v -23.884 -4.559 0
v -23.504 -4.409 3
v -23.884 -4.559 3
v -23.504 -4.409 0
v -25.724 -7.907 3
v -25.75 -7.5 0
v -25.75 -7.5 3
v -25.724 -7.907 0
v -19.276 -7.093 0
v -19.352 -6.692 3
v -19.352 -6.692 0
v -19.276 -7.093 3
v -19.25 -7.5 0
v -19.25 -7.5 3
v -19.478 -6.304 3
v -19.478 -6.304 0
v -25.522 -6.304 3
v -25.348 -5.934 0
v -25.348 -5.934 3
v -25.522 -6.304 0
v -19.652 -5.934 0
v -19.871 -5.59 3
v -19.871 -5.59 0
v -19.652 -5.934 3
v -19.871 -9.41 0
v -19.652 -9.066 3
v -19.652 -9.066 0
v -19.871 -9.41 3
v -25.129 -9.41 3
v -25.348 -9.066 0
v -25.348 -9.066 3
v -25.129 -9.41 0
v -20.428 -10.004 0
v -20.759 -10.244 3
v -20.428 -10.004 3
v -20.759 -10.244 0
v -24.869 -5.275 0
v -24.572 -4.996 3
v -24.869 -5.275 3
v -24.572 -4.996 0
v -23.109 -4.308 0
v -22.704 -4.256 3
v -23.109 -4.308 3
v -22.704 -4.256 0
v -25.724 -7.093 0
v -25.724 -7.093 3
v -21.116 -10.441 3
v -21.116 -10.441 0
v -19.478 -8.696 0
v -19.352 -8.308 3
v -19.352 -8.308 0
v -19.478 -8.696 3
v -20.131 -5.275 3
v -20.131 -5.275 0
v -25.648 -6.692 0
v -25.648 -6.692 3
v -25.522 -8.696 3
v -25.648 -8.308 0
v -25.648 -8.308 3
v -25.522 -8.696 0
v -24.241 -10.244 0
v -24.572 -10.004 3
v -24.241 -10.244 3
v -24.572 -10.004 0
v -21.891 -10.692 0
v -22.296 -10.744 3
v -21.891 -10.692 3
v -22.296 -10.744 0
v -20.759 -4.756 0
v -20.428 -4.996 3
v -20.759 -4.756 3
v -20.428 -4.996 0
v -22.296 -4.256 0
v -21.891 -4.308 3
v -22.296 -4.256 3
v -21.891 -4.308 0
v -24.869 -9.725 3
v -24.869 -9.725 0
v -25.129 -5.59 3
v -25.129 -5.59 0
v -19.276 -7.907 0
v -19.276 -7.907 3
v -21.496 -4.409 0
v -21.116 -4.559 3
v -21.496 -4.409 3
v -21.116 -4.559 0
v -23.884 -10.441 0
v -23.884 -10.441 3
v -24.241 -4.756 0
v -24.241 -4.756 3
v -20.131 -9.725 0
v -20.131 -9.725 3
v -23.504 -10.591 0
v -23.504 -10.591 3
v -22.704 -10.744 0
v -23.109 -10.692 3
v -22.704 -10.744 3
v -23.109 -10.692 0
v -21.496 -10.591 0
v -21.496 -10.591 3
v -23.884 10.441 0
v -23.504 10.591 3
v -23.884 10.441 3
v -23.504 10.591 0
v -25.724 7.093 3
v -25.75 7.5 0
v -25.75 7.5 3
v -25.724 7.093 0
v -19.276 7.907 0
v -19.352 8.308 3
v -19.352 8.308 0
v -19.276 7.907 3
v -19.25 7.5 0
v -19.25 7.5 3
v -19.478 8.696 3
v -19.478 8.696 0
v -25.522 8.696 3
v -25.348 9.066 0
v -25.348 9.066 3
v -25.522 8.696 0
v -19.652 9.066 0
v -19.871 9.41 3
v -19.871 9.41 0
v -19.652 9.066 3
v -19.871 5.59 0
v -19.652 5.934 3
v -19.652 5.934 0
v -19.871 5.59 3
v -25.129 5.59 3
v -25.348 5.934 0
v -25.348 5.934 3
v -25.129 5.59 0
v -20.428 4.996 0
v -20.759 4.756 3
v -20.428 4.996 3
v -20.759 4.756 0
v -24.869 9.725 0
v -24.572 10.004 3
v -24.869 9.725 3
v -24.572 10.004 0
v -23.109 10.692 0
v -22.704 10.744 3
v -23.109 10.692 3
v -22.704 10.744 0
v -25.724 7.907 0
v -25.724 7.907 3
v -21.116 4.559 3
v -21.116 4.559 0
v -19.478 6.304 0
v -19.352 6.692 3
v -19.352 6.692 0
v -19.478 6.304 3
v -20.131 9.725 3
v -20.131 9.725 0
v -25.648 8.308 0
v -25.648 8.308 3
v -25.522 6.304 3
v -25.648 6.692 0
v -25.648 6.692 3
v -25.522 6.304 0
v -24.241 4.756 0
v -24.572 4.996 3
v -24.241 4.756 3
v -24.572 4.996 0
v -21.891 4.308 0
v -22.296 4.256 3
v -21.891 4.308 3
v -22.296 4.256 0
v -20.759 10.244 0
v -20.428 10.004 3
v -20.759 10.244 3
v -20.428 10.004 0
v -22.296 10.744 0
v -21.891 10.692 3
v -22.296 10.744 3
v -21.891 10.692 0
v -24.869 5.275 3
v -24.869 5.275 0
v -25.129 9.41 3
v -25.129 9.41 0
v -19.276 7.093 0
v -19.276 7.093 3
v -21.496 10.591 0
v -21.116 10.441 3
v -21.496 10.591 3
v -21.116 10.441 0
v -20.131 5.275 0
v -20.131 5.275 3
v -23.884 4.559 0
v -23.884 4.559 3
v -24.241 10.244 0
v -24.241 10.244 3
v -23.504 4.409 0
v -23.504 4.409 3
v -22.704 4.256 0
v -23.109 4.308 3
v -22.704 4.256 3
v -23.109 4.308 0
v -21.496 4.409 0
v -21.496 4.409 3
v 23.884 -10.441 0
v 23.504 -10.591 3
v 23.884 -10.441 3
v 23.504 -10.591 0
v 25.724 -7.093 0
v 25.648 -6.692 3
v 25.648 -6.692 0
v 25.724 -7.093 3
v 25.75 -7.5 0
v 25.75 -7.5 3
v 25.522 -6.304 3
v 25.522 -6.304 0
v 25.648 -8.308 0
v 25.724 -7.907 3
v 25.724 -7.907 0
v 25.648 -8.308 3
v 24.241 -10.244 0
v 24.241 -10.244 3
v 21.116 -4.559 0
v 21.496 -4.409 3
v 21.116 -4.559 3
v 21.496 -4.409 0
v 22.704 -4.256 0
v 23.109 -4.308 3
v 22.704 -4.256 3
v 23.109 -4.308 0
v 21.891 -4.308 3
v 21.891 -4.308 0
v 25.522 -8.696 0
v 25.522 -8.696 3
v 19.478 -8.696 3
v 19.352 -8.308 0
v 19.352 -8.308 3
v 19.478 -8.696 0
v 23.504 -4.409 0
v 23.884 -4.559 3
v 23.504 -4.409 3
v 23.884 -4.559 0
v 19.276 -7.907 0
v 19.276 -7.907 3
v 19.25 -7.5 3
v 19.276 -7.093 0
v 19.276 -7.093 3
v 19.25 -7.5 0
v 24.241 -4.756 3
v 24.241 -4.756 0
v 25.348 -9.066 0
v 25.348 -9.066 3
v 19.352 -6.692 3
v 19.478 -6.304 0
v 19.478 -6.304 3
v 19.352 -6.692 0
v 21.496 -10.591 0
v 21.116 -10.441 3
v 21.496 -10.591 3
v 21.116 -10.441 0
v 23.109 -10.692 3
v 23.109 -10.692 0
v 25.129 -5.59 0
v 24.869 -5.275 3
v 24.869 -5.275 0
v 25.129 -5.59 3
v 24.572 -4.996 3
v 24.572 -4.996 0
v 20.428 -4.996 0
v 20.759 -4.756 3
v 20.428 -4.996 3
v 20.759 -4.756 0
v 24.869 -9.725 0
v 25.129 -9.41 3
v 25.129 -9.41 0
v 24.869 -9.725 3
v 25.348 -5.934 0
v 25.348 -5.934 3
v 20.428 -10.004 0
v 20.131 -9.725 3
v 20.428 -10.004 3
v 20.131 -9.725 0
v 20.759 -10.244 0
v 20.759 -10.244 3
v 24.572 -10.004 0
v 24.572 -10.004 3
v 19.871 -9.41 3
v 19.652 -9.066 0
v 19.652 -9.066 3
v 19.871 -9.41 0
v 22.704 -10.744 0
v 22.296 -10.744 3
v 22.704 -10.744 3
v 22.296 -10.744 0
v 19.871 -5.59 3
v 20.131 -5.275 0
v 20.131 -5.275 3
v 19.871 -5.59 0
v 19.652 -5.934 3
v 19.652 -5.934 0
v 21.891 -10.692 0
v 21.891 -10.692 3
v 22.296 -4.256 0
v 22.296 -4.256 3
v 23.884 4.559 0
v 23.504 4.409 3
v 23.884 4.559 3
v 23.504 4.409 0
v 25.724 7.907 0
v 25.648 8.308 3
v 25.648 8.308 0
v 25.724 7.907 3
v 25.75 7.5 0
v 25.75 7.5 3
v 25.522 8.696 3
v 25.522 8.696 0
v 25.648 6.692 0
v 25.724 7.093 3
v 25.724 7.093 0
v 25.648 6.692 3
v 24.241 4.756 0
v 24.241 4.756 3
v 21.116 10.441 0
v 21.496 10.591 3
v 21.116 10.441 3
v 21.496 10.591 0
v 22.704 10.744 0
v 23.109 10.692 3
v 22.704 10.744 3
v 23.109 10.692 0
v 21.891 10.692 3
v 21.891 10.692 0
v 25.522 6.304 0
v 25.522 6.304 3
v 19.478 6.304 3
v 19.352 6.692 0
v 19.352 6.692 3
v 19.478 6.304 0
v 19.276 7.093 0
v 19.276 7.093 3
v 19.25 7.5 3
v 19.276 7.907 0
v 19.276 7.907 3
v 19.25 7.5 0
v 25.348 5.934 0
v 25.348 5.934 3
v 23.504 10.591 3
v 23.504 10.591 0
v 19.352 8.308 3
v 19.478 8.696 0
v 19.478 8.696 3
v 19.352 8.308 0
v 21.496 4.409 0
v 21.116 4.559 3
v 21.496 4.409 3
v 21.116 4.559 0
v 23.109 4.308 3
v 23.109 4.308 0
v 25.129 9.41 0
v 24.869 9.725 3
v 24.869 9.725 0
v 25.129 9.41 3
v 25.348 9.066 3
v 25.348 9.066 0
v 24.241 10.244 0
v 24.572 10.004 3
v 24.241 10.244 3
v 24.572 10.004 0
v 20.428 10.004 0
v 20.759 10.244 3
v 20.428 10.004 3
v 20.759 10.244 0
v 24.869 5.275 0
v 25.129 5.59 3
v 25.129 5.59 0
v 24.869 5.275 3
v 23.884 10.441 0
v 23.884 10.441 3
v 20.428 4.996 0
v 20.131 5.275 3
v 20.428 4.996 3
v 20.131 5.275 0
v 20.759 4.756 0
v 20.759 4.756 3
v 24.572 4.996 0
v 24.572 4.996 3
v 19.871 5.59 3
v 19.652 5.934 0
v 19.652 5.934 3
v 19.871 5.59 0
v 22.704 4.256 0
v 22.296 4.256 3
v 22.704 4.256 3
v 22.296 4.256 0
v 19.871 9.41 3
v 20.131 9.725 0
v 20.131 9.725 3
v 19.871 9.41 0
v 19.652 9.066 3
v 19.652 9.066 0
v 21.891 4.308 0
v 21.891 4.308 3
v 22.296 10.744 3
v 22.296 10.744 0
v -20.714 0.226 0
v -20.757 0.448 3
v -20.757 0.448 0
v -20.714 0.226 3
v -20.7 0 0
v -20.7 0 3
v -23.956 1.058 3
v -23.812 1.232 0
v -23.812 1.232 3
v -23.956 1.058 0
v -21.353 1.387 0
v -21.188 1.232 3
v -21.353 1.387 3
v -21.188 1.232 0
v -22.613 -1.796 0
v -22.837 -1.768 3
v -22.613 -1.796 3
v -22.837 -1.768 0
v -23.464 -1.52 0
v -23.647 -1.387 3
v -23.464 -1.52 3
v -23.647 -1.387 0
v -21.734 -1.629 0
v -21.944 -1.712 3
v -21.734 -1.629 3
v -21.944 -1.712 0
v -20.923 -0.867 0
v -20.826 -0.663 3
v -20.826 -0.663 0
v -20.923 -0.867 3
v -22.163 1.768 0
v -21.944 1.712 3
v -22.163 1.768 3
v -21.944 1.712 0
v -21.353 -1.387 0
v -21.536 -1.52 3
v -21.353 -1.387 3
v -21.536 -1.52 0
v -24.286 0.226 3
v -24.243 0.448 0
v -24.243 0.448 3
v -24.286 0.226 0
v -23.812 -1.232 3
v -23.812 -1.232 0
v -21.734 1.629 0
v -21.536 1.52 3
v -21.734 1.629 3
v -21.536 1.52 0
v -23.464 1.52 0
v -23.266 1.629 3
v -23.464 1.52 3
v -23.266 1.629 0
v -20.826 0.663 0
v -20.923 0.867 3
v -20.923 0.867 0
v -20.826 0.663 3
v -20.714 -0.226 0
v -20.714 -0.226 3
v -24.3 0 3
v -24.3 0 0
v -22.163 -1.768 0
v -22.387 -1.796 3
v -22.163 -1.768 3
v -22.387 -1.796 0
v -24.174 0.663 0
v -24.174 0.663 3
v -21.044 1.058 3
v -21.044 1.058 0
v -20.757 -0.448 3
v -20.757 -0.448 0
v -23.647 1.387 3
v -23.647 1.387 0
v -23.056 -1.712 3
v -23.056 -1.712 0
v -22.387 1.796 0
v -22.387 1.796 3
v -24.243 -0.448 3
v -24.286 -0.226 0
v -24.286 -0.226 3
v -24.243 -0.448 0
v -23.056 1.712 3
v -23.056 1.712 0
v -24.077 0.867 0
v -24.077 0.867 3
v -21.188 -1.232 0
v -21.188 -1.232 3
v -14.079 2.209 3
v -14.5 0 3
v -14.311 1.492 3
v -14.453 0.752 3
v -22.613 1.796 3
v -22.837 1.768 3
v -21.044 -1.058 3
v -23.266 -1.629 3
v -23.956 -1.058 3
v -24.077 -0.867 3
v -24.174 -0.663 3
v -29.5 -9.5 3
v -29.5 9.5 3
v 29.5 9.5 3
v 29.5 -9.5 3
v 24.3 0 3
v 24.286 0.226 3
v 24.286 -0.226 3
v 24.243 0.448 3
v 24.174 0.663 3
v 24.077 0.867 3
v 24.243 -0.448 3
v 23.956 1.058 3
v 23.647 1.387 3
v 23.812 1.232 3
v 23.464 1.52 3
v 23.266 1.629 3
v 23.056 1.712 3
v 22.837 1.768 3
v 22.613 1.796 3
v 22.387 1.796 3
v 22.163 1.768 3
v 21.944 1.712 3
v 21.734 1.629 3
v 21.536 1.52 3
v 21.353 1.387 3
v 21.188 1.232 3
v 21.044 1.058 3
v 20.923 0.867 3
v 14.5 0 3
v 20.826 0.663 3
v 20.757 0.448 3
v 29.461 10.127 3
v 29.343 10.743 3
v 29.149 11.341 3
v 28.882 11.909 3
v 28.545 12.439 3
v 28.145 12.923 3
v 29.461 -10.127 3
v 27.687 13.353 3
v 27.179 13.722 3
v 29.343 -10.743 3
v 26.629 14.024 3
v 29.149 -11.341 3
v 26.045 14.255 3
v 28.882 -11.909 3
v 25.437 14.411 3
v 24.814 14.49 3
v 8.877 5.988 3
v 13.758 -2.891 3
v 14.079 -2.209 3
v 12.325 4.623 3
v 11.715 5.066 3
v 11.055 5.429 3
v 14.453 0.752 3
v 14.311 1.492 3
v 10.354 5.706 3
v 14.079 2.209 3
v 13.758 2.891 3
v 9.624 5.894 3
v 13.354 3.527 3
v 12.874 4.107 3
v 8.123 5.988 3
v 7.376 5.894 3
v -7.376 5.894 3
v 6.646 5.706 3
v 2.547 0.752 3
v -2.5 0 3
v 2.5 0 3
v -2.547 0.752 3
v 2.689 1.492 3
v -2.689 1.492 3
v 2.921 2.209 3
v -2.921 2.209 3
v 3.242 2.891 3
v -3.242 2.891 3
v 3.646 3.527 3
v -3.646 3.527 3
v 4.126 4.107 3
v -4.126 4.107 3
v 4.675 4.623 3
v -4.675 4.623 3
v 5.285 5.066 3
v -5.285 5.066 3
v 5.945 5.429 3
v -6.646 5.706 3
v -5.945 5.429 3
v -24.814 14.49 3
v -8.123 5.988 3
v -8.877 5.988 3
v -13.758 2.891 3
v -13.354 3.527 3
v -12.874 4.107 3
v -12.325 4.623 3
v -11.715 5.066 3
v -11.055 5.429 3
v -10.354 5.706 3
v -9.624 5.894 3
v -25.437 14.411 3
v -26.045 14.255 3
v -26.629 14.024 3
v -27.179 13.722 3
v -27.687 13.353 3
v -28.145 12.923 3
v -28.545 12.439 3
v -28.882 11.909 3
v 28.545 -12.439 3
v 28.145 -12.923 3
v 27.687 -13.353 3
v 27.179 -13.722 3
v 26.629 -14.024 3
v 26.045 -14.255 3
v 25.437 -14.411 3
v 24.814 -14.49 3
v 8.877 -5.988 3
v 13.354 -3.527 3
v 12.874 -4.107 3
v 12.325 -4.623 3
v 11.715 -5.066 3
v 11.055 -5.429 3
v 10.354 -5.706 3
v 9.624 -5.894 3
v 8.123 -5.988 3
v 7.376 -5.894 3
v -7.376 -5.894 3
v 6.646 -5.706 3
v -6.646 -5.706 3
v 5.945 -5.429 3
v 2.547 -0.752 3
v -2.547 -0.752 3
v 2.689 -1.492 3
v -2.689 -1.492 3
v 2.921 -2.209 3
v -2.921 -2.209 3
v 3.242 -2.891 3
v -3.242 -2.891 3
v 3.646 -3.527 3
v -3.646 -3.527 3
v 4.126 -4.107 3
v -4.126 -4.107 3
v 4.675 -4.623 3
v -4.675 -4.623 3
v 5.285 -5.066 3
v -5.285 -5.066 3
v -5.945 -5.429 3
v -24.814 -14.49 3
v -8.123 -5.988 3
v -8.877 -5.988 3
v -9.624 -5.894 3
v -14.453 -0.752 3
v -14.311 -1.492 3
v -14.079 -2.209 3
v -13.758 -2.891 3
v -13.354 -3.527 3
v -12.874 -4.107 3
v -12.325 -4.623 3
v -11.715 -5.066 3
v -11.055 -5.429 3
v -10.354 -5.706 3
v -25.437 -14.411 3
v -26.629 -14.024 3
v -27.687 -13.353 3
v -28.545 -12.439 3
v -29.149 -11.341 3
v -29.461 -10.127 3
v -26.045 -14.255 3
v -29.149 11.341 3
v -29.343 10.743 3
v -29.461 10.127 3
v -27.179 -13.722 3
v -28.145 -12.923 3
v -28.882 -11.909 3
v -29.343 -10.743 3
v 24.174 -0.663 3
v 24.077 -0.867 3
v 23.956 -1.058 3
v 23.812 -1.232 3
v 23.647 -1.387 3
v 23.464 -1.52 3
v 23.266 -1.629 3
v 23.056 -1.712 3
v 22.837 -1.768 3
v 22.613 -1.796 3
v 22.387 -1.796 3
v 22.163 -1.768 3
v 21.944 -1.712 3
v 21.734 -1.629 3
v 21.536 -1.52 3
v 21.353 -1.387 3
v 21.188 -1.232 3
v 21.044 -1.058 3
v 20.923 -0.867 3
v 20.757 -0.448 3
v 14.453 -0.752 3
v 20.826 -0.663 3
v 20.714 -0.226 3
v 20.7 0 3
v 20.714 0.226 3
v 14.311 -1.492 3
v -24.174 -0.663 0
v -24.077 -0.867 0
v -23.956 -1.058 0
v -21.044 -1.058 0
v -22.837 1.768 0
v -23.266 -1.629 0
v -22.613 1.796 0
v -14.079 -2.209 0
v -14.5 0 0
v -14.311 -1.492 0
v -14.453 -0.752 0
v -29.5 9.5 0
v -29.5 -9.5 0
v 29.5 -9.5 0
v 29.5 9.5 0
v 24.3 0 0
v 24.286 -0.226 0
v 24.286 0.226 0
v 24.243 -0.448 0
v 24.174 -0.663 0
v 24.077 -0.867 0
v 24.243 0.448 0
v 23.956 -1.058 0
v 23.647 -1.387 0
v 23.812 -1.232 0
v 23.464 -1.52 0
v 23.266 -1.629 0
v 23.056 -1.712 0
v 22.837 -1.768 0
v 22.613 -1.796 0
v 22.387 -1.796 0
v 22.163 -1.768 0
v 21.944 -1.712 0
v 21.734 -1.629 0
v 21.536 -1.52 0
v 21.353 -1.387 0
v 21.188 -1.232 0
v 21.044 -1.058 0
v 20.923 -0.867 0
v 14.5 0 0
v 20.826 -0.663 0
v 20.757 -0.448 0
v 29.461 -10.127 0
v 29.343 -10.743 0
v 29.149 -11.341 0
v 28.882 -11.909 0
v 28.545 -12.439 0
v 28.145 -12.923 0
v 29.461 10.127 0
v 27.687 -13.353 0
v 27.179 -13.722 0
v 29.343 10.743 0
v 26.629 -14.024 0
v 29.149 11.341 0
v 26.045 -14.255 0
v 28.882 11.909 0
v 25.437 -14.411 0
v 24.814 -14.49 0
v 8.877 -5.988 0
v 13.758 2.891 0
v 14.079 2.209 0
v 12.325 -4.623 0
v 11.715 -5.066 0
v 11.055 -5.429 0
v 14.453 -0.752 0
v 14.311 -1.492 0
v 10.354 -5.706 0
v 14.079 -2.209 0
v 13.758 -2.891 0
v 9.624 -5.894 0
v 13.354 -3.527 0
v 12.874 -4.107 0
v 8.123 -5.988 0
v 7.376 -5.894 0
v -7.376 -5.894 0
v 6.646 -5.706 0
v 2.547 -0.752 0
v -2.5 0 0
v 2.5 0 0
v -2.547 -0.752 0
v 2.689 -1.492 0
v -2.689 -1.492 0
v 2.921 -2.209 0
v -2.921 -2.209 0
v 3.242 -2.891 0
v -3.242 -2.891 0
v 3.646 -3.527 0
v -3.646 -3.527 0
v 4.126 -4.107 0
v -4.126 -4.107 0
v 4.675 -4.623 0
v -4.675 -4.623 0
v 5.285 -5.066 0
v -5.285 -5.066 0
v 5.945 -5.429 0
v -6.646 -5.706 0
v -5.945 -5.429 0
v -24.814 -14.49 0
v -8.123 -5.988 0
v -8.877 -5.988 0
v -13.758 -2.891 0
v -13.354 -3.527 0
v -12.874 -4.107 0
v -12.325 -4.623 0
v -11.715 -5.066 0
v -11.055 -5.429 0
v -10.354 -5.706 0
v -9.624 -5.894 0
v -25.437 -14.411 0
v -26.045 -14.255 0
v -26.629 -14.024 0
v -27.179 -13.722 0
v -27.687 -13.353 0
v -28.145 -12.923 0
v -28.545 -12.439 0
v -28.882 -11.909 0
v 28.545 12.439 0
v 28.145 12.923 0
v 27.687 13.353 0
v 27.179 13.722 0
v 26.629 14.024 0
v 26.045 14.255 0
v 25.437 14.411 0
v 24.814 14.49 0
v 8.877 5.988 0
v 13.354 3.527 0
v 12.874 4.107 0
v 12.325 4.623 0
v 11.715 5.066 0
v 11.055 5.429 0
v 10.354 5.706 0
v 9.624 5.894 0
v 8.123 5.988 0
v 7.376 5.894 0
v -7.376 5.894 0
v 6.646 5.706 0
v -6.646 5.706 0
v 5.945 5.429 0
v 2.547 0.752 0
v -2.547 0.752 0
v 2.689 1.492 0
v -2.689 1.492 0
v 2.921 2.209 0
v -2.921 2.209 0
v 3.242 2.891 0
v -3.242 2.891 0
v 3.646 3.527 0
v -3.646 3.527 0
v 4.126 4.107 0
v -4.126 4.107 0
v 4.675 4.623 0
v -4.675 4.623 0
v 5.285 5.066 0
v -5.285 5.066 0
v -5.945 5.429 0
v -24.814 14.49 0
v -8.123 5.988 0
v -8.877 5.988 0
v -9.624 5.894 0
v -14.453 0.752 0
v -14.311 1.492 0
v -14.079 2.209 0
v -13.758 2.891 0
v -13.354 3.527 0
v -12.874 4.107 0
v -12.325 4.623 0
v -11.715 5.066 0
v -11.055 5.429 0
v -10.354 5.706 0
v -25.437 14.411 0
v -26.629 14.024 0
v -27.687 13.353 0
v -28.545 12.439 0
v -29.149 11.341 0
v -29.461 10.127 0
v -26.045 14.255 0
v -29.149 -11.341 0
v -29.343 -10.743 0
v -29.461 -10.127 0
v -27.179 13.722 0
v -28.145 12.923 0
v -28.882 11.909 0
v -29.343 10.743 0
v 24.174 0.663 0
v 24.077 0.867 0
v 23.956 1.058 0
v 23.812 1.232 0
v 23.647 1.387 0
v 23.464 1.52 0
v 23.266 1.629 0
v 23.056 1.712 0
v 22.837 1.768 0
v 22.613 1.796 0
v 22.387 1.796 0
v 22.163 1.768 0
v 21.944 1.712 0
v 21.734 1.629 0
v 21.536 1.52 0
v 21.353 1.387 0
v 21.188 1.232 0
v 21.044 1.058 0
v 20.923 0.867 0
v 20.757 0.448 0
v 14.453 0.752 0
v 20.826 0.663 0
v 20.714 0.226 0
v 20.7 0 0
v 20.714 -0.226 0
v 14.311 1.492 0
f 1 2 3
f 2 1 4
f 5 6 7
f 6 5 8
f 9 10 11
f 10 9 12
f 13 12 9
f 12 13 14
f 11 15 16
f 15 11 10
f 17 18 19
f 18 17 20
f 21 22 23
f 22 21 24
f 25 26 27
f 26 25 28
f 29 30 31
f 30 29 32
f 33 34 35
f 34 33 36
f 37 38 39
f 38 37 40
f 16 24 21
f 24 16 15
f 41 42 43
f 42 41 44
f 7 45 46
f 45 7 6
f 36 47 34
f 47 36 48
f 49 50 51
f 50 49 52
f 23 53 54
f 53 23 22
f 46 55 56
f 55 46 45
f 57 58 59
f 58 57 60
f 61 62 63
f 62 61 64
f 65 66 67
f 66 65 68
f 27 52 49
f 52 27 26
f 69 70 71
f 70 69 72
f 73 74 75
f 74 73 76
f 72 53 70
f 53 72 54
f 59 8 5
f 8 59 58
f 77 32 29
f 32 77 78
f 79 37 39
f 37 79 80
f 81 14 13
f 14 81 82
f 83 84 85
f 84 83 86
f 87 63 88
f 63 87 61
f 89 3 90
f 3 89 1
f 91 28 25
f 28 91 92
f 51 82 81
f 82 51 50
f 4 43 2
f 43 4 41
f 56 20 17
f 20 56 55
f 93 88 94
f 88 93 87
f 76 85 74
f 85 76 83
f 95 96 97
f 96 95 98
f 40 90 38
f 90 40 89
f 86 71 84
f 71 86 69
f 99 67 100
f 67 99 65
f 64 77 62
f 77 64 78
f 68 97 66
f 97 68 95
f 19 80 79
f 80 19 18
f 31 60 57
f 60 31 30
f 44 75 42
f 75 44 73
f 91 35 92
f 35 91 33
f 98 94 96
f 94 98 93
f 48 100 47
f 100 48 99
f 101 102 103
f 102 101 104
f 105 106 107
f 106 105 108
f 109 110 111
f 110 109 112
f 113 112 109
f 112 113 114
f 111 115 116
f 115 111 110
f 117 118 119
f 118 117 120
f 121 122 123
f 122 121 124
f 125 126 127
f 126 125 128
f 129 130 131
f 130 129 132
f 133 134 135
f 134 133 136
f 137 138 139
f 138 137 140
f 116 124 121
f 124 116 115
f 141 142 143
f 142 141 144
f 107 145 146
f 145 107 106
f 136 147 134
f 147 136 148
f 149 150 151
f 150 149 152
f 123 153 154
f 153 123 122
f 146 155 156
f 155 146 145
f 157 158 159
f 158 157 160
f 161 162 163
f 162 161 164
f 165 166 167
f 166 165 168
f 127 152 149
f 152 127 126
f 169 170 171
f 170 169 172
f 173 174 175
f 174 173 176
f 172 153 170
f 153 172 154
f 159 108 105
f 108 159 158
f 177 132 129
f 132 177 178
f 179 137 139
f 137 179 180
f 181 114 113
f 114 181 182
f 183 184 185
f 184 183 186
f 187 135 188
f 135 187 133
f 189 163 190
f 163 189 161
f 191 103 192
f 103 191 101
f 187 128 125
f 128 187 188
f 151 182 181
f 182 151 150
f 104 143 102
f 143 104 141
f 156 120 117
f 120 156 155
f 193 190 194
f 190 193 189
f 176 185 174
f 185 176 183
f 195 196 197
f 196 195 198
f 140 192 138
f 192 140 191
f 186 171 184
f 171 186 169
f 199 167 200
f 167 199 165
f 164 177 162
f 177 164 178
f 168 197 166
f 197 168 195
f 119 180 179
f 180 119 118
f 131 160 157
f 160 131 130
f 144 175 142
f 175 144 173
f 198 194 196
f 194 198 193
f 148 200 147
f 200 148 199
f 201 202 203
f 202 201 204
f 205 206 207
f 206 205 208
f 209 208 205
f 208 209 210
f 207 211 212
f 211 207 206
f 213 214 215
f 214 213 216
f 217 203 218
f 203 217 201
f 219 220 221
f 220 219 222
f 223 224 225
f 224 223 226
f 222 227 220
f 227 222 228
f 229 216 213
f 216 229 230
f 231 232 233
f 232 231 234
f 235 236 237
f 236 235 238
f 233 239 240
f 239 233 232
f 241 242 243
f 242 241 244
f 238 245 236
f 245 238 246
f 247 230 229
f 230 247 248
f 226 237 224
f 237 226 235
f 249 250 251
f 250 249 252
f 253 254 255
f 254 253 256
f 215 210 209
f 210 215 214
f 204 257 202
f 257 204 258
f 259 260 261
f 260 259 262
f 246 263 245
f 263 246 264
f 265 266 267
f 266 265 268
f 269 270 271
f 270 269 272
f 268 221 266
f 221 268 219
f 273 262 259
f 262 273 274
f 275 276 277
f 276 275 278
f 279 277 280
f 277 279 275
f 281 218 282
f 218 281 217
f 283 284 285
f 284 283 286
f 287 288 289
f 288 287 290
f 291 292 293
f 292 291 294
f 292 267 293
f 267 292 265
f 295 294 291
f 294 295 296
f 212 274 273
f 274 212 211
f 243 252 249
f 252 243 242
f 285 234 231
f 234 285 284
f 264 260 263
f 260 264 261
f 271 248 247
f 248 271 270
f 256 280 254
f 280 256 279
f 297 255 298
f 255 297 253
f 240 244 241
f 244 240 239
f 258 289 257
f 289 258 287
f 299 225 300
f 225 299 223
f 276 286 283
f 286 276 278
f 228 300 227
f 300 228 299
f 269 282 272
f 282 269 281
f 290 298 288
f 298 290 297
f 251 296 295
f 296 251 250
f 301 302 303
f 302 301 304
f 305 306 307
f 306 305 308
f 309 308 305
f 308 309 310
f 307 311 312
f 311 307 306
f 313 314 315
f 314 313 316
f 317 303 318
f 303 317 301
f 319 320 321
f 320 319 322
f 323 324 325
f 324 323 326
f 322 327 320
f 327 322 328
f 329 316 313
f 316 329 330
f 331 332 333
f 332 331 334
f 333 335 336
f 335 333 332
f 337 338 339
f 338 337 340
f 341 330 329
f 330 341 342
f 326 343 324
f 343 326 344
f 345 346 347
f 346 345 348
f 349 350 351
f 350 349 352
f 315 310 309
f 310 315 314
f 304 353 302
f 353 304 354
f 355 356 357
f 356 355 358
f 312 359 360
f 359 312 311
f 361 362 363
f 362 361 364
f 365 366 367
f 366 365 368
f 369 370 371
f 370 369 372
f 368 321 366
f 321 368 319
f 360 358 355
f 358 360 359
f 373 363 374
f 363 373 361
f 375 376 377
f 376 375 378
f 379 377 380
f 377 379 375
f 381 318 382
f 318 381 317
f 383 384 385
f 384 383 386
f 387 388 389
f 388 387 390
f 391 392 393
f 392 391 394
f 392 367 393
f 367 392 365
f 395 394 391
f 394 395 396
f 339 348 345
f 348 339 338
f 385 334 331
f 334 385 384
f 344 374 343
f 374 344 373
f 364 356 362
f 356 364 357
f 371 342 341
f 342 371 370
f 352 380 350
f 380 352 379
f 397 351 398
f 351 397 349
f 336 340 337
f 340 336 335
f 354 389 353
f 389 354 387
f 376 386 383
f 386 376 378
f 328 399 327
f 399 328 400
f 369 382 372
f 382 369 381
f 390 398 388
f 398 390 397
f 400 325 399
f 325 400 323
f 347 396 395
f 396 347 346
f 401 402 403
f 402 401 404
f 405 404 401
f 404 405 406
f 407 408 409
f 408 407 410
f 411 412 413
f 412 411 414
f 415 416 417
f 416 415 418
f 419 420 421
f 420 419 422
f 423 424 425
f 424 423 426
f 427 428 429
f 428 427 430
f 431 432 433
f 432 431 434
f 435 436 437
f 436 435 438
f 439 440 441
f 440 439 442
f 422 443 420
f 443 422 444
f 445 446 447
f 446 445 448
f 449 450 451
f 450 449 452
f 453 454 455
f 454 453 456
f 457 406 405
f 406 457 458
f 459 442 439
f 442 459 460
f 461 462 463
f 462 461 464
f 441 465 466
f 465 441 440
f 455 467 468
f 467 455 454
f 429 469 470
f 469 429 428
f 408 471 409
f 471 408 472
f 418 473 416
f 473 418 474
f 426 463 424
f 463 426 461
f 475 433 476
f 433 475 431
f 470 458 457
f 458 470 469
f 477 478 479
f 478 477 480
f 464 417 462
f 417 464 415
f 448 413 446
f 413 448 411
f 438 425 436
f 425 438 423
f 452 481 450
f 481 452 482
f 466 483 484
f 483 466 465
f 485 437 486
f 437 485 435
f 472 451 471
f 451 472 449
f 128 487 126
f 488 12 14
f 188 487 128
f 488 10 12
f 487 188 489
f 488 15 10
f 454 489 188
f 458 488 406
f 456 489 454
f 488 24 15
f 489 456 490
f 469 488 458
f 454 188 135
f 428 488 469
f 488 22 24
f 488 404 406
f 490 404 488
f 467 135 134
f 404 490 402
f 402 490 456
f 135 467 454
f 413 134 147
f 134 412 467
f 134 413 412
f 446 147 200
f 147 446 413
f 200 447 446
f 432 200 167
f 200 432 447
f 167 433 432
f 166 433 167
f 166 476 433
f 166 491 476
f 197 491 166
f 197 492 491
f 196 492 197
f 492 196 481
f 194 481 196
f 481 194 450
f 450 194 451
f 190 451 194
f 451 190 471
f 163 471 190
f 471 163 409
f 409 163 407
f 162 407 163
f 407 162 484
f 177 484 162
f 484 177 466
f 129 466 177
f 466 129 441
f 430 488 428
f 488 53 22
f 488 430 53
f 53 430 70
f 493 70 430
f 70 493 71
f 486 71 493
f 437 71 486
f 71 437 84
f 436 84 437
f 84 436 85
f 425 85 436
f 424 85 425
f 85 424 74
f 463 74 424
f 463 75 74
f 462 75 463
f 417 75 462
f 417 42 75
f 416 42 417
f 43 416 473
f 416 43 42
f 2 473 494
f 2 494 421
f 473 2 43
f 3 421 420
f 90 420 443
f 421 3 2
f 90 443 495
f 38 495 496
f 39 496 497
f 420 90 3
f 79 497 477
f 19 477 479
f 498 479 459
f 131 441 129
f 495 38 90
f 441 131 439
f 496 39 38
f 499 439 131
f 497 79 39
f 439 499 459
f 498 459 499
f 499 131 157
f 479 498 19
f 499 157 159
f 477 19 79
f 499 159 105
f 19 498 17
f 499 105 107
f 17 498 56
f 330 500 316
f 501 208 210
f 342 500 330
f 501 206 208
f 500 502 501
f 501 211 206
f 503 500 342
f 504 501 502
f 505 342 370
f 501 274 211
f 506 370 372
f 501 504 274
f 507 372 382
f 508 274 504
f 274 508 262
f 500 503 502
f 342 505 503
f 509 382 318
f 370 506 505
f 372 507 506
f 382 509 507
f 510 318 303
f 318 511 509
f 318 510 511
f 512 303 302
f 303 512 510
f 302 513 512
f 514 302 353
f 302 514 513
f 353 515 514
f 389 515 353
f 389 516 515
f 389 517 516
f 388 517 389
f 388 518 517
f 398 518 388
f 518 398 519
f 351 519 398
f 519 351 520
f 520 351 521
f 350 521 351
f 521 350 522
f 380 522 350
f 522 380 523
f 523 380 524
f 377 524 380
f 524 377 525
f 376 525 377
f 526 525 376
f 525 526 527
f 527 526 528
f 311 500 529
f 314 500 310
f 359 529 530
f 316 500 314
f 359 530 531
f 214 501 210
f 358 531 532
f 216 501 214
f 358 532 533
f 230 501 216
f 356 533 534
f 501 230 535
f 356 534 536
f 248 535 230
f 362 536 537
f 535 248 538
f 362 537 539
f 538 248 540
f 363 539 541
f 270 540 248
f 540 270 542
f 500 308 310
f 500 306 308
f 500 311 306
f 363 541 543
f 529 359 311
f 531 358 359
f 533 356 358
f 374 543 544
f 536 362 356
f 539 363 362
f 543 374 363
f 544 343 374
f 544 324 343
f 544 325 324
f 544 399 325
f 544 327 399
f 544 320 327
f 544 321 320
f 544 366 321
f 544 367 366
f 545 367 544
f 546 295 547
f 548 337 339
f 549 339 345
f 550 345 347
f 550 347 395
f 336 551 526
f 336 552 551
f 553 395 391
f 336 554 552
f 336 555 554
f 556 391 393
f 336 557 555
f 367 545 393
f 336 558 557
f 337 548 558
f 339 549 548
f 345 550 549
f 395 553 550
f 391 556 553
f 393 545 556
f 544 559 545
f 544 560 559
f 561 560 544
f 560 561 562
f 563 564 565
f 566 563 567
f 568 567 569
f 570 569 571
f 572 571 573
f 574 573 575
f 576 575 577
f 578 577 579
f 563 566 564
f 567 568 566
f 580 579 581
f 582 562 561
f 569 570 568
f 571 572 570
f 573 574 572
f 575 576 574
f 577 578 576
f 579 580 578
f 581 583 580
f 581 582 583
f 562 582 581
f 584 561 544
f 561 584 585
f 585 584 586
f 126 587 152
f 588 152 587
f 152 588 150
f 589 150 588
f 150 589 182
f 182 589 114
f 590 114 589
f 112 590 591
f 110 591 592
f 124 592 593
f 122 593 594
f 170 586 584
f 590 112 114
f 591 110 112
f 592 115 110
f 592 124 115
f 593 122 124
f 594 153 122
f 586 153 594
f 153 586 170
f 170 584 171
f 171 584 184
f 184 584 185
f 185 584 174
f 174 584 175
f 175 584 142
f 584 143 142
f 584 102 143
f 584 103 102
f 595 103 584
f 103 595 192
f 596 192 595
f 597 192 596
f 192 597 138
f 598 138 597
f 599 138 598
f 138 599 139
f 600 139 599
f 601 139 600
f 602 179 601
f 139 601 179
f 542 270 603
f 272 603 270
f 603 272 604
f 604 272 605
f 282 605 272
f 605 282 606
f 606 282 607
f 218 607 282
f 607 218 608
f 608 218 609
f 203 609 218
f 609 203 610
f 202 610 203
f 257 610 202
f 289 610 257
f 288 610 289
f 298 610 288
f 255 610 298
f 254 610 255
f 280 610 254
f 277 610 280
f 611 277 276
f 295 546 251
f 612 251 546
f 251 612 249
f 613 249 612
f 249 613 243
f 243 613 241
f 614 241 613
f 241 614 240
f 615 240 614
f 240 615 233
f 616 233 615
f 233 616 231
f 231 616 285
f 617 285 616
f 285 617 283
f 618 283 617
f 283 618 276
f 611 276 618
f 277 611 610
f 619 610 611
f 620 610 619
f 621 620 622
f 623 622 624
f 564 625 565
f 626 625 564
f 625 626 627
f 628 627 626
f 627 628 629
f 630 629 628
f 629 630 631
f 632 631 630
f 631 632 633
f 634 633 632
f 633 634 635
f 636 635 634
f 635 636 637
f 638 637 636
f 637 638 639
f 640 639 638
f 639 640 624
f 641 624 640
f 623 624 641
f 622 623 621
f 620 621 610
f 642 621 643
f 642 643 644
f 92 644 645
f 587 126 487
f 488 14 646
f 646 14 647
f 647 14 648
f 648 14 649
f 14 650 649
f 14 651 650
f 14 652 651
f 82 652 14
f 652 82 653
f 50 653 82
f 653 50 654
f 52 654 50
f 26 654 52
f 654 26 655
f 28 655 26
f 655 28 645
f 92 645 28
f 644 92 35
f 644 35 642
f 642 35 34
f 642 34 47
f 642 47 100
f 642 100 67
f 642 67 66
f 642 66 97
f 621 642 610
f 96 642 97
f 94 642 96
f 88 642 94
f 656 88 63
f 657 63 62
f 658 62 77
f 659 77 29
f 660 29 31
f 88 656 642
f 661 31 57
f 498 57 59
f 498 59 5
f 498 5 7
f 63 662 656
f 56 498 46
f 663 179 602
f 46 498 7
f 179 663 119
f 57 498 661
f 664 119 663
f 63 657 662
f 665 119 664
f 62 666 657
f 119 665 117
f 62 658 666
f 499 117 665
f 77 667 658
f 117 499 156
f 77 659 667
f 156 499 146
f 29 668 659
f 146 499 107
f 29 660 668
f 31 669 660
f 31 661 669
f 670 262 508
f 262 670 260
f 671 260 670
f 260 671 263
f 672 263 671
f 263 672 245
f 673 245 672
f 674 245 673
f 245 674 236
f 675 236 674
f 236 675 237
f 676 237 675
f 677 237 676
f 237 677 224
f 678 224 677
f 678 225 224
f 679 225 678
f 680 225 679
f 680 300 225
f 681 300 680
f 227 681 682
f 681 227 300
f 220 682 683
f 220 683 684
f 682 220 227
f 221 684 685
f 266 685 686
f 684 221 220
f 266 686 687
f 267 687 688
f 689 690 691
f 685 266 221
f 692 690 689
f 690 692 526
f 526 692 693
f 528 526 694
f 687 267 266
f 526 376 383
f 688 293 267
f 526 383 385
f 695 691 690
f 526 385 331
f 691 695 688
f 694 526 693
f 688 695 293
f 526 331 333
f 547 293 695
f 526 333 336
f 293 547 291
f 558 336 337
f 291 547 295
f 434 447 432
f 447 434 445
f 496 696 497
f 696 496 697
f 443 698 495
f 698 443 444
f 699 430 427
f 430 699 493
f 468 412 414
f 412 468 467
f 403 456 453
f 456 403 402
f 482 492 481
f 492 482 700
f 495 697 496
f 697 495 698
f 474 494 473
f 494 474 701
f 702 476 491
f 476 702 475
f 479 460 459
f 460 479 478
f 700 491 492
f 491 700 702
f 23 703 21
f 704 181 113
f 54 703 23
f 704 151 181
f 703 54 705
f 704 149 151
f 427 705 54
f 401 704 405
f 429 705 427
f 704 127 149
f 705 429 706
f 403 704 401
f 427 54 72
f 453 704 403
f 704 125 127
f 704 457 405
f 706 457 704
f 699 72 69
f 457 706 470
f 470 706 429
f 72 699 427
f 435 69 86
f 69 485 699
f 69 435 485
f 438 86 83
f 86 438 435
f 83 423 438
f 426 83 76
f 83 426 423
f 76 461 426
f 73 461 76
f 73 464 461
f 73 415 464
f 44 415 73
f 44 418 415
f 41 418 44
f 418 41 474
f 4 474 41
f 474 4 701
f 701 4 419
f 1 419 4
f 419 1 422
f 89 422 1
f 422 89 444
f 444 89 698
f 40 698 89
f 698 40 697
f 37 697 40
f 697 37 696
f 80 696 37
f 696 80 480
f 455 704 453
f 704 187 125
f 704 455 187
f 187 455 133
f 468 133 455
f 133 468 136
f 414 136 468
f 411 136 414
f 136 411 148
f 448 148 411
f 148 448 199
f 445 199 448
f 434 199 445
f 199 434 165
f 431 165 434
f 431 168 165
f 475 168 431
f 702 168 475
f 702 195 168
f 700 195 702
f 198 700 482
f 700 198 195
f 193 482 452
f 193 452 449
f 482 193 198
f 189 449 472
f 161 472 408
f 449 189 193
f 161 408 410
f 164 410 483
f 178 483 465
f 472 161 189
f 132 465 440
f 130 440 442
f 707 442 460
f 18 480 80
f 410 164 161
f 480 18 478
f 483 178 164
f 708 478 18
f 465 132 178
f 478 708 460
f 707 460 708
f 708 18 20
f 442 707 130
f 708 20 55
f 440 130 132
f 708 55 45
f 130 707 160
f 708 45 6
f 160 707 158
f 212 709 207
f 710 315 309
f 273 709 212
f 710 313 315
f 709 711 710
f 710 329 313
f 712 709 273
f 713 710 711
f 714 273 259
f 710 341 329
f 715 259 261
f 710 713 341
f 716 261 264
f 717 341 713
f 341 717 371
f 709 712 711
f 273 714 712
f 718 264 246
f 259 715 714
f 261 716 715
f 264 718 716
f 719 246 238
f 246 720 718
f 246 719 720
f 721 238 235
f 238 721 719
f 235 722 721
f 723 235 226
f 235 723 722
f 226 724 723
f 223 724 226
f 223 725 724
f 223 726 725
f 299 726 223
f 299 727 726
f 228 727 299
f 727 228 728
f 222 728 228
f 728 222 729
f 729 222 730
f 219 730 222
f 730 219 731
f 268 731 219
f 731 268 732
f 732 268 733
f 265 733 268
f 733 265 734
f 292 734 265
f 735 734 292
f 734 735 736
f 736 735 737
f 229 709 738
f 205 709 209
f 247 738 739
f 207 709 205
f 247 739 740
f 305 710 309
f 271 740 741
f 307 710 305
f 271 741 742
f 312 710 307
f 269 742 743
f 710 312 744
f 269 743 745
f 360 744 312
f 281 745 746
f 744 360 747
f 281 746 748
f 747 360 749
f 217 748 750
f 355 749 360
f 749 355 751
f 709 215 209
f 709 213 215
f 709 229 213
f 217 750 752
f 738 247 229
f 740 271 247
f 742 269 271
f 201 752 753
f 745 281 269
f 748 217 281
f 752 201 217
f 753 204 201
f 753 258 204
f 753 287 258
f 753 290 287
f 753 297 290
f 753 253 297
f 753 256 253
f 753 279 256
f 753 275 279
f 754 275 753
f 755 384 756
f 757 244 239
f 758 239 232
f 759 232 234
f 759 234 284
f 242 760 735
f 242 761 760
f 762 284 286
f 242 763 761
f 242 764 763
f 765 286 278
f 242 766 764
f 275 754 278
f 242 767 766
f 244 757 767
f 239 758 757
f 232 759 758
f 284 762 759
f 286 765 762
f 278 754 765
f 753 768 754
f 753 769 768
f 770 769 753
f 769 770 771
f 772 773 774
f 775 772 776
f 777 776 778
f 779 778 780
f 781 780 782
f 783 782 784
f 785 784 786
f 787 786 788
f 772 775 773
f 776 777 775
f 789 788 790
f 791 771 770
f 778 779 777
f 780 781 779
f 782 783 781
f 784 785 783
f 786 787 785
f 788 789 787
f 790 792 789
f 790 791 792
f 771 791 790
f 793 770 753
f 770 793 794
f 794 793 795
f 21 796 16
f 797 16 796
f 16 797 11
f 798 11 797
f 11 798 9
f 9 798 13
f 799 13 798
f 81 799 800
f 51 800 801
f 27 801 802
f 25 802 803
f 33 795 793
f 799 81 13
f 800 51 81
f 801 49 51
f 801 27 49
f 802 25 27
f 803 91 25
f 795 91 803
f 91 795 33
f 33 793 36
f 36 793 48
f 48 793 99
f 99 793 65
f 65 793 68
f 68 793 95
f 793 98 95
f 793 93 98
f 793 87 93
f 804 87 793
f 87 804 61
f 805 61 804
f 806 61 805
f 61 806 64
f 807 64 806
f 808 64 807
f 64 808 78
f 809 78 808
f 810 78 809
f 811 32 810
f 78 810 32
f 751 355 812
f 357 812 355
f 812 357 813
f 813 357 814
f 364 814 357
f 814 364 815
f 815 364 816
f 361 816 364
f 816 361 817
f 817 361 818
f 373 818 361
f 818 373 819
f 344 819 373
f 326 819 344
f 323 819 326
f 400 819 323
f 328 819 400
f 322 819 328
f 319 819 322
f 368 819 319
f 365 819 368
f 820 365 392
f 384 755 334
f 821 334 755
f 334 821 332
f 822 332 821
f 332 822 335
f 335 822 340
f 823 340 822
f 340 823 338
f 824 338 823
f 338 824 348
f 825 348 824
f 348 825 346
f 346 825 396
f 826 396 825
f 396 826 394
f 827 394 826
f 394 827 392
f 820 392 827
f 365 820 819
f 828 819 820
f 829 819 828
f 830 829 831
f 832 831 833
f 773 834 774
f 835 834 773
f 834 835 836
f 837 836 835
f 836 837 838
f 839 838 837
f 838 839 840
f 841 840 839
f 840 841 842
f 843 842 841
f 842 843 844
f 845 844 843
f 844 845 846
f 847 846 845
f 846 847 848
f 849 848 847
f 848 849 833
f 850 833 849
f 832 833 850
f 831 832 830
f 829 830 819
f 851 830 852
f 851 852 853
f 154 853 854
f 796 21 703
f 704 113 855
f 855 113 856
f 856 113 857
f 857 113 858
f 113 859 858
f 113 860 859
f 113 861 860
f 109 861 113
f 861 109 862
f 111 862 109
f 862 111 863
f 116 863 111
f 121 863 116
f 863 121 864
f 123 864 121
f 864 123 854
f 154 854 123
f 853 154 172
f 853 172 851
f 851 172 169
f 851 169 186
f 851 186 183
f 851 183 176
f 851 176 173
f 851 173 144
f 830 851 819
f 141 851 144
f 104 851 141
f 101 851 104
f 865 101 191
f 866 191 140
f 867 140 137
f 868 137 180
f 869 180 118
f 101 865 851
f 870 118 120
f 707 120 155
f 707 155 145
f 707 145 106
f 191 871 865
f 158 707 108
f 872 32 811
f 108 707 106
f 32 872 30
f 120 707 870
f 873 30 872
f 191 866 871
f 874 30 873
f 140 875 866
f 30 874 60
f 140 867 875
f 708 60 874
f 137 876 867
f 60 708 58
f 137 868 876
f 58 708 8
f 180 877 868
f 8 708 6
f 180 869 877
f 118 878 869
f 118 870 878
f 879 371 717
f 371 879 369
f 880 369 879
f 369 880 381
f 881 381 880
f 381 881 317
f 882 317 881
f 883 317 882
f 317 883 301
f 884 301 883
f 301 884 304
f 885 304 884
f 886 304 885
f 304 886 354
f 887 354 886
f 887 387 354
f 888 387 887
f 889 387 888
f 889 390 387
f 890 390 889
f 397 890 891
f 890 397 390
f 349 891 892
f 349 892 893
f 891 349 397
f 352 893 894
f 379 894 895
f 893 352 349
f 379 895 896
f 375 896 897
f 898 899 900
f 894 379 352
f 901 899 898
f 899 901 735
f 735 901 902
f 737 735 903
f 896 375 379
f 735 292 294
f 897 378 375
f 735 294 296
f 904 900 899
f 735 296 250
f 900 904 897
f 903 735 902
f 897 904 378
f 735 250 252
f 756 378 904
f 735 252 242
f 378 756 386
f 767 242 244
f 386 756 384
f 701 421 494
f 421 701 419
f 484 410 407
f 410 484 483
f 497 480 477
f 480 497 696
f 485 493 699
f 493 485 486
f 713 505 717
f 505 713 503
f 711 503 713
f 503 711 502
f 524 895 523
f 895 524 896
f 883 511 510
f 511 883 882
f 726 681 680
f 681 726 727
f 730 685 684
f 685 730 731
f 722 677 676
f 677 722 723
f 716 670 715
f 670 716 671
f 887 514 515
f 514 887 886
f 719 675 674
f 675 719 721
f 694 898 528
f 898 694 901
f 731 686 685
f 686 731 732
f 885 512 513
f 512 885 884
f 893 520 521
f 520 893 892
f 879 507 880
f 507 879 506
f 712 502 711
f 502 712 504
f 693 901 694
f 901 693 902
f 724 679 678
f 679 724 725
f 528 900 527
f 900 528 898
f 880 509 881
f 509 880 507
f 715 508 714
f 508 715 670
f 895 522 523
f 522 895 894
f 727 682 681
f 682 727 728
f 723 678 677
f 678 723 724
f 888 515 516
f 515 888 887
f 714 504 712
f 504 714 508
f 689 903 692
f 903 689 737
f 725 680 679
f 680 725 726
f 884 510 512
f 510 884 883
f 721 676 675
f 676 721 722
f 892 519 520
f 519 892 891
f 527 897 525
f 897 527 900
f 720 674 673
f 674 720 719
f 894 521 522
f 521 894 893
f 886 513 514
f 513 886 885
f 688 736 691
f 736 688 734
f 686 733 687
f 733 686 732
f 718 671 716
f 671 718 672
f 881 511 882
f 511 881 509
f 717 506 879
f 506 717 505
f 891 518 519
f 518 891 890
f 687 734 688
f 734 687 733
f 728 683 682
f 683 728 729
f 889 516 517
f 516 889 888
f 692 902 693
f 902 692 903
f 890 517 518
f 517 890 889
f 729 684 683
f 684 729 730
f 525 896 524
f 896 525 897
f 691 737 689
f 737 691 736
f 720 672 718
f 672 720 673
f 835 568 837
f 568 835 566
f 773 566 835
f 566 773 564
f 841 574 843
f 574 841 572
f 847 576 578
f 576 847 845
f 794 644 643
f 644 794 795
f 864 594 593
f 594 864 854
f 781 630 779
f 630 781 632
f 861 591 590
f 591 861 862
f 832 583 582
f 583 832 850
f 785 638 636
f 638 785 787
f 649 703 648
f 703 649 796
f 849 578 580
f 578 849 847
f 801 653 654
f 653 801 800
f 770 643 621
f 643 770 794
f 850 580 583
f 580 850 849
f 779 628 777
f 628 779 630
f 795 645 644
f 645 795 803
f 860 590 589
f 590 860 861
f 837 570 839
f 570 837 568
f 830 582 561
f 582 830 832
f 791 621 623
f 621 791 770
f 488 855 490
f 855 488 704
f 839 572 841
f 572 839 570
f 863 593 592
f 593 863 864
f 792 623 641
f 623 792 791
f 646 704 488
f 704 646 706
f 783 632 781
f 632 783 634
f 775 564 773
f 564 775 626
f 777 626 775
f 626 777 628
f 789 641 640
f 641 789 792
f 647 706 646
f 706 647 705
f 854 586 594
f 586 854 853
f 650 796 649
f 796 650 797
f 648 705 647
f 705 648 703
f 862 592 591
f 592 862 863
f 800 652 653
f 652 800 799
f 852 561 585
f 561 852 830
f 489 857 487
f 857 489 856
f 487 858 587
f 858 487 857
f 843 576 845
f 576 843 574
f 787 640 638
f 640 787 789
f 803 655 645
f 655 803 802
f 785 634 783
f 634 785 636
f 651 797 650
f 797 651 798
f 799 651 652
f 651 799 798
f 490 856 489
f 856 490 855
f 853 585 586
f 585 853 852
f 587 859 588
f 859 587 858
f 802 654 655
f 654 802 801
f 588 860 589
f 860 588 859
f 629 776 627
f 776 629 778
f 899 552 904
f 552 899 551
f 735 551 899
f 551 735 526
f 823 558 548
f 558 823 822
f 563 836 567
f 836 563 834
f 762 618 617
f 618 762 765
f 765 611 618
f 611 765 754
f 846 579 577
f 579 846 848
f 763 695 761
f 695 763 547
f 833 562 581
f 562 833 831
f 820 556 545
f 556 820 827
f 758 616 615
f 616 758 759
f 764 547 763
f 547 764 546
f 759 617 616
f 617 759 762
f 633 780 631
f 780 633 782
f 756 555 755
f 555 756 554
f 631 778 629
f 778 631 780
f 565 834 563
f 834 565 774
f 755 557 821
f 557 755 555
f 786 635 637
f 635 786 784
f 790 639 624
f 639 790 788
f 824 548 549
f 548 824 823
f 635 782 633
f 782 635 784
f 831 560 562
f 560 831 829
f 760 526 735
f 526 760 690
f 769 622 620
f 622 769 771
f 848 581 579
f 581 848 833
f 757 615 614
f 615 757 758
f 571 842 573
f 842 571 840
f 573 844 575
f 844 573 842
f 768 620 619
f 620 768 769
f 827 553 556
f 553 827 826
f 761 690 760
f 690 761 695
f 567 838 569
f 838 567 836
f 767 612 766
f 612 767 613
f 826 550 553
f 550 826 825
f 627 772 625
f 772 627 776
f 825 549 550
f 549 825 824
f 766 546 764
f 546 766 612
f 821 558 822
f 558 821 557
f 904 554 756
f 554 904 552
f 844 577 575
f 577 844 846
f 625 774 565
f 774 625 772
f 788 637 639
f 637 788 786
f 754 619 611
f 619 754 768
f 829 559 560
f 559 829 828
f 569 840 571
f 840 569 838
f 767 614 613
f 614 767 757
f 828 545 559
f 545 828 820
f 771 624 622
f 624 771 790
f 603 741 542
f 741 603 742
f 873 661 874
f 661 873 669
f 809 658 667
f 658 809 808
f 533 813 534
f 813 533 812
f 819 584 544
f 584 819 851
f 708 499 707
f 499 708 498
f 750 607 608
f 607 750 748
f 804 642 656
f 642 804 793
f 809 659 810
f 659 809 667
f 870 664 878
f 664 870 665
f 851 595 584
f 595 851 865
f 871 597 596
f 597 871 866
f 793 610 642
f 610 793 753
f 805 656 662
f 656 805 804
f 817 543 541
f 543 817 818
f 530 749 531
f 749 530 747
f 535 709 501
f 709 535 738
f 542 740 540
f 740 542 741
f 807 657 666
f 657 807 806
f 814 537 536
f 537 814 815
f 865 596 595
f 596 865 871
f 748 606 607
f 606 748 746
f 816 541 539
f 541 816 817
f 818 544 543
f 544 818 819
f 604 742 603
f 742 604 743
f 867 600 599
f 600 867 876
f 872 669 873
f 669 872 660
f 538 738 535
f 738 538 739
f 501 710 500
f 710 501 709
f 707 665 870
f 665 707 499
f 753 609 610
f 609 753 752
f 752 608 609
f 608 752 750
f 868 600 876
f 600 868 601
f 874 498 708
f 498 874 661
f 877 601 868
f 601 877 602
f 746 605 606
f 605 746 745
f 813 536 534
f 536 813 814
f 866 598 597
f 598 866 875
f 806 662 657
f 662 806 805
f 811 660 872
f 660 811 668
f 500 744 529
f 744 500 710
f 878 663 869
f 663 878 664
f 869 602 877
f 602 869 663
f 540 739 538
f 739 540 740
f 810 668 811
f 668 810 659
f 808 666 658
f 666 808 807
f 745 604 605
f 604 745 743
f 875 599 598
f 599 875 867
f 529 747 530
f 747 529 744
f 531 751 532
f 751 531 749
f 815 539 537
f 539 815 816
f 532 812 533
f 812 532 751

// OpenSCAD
$fn = 50;


difference() {
	union() {
		hull() {
			translate(v = [-24.5000000000, 9.5000000000, 0]) {
				cylinder(h = 3, r = 5);
			}
			translate(v = [24.5000000000, 9.5000000000, 0]) {
				cylinder(h = 3, r = 5);
			}
			translate(v = [-24.5000000000, -9.5000000000, 0]) {
				cylinder(h = 3, r = 5);
			}
			translate(v = [24.5000000000, -9.5000000000, 0]) {
				cylinder(h = 3, r = 5);
			}
		}
	}
	union() {
		#translate(v = [-22.5000000000, -7.5000000000, 0]) {
			cylinder(h = 3, r = 3.2500000000);
		}
		#translate(v = [-22.5000000000, 7.5000000000, 0]) {
			cylinder(h = 3, r = 3.2500000000);
		}
		#translate(v = [22.5000000000, -7.5000000000, 0]) {
			cylinder(h = 3, r = 3.2500000000);
		}
		#translate(v = [22.5000000000, 7.5000000000, 0]) {
			cylinder(h = 3, r = 3.2500000000);
		}
		#translate(v = [-22.5000000000, -7.5000000000, -100.0000000000]) {
			cylinder(h = 200, r = 3.2500000000);
		}
		#translate(v = [-22.5000000000, 7.5000000000, -100.0000000000]) {
			cylinder(h = 200, r = 3.2500000000);
		}
		#translate(v = [22.5000000000, -7.5000000000, -100.0000000000]) {
			cylinder(h = 200, r = 3.2500000000);
		}
		#translate(v = [22.5000000000, 7.5000000000, -100.0000000000]) {
			cylinder(h = 200, r = 3.2500000000);
		}
		#translate(v = [-22.5000000000, -7.5000000000, 0]) {
			cylinder(h = 3, r = 1.8000000000);
		}
		#translate(v = [-22.5000000000, 0.0000000000, 0]) {
			cylinder(h = 3, r = 1.8000000000);
		}
		#translate(v = [-22.5000000000, 7.5000000000, 0]) {
			cylinder(h = 3, r = 1.8000000000);
		}
		#translate(v = [22.5000000000, -7.5000000000, 0]) {
			cylinder(h = 3, r = 1.8000000000);
		}
		#translate(v = [22.5000000000, 0.0000000000, 0]) {
			cylinder(h = 3, r = 1.8000000000);
		}
		#translate(v = [22.5000000000, 7.5000000000, 0]) {
			cylinder(h = 3, r = 1.8000000000);
		}
		#translate(v = [-22.5000000000, -7.5000000000, 0]) {
			cylinder(h = 3, r = 1.8000000000);
		}
		#translate(v = [-22.5000000000, 0.0000000000, 0]) {
			cylinder(h = 3, r = 1.8000000000);
		}
		#translate(v = [-22.5000000000, 7.5000000000, 0]) {
			cylinder(h = 3, r = 1.8000000000);
		}
		#translate(v = [22.5000000000, -7.5000000000, 0]) {
			cylinder(h = 3, r = 1.8000000000);
		}
		#translate(v = [22.5000000000, 0.0000000000, 0]) {
			cylinder(h = 3, r = 1.8000000000);
		}
		#translate(v = [22.5000000000, 7.5000000000, 0]) {
			cylinder(h = 3, r = 1.8000000000);
		}
		#translate(v = [-22.5000000000, -7.5000000000, 0]) {
			cylinder(h = 3, r = 1.8000000000);
		}
		#translate(v = [-22.5000000000, 0.0000000000, 0]) {
			cylinder(h = 3, r = 1.8000000000);
		}
		#translate(v = [-22.5000000000, 7.5000000000, 0]) {
			cylinder(h = 3, r = 1.8000000000);
		}
		#translate(v = [22.5000000000, -7.5000000000, 0]) {
			cylinder(h = 3, r = 1.8000000000);
		}
		#translate(v = [22.5000000000, 0.0000000000, 0]) {
			cylinder(h = 3, r = 1.8000000000);
		}
		#translate(v = [22.5000000000, 7.5000000000, 0]) {
			cylinder(h = 3, r = 1.8000000000);
		}
		#translate(v = [-8.5000000000, 0, 0]) {
			cylinder(h = 3, r = 6.0000000000);
		}
		#translate(v = [8.5000000000, 0, 0]) {
			cylinder(h = 3, r = 6.0000000000);
		}
	}
}
